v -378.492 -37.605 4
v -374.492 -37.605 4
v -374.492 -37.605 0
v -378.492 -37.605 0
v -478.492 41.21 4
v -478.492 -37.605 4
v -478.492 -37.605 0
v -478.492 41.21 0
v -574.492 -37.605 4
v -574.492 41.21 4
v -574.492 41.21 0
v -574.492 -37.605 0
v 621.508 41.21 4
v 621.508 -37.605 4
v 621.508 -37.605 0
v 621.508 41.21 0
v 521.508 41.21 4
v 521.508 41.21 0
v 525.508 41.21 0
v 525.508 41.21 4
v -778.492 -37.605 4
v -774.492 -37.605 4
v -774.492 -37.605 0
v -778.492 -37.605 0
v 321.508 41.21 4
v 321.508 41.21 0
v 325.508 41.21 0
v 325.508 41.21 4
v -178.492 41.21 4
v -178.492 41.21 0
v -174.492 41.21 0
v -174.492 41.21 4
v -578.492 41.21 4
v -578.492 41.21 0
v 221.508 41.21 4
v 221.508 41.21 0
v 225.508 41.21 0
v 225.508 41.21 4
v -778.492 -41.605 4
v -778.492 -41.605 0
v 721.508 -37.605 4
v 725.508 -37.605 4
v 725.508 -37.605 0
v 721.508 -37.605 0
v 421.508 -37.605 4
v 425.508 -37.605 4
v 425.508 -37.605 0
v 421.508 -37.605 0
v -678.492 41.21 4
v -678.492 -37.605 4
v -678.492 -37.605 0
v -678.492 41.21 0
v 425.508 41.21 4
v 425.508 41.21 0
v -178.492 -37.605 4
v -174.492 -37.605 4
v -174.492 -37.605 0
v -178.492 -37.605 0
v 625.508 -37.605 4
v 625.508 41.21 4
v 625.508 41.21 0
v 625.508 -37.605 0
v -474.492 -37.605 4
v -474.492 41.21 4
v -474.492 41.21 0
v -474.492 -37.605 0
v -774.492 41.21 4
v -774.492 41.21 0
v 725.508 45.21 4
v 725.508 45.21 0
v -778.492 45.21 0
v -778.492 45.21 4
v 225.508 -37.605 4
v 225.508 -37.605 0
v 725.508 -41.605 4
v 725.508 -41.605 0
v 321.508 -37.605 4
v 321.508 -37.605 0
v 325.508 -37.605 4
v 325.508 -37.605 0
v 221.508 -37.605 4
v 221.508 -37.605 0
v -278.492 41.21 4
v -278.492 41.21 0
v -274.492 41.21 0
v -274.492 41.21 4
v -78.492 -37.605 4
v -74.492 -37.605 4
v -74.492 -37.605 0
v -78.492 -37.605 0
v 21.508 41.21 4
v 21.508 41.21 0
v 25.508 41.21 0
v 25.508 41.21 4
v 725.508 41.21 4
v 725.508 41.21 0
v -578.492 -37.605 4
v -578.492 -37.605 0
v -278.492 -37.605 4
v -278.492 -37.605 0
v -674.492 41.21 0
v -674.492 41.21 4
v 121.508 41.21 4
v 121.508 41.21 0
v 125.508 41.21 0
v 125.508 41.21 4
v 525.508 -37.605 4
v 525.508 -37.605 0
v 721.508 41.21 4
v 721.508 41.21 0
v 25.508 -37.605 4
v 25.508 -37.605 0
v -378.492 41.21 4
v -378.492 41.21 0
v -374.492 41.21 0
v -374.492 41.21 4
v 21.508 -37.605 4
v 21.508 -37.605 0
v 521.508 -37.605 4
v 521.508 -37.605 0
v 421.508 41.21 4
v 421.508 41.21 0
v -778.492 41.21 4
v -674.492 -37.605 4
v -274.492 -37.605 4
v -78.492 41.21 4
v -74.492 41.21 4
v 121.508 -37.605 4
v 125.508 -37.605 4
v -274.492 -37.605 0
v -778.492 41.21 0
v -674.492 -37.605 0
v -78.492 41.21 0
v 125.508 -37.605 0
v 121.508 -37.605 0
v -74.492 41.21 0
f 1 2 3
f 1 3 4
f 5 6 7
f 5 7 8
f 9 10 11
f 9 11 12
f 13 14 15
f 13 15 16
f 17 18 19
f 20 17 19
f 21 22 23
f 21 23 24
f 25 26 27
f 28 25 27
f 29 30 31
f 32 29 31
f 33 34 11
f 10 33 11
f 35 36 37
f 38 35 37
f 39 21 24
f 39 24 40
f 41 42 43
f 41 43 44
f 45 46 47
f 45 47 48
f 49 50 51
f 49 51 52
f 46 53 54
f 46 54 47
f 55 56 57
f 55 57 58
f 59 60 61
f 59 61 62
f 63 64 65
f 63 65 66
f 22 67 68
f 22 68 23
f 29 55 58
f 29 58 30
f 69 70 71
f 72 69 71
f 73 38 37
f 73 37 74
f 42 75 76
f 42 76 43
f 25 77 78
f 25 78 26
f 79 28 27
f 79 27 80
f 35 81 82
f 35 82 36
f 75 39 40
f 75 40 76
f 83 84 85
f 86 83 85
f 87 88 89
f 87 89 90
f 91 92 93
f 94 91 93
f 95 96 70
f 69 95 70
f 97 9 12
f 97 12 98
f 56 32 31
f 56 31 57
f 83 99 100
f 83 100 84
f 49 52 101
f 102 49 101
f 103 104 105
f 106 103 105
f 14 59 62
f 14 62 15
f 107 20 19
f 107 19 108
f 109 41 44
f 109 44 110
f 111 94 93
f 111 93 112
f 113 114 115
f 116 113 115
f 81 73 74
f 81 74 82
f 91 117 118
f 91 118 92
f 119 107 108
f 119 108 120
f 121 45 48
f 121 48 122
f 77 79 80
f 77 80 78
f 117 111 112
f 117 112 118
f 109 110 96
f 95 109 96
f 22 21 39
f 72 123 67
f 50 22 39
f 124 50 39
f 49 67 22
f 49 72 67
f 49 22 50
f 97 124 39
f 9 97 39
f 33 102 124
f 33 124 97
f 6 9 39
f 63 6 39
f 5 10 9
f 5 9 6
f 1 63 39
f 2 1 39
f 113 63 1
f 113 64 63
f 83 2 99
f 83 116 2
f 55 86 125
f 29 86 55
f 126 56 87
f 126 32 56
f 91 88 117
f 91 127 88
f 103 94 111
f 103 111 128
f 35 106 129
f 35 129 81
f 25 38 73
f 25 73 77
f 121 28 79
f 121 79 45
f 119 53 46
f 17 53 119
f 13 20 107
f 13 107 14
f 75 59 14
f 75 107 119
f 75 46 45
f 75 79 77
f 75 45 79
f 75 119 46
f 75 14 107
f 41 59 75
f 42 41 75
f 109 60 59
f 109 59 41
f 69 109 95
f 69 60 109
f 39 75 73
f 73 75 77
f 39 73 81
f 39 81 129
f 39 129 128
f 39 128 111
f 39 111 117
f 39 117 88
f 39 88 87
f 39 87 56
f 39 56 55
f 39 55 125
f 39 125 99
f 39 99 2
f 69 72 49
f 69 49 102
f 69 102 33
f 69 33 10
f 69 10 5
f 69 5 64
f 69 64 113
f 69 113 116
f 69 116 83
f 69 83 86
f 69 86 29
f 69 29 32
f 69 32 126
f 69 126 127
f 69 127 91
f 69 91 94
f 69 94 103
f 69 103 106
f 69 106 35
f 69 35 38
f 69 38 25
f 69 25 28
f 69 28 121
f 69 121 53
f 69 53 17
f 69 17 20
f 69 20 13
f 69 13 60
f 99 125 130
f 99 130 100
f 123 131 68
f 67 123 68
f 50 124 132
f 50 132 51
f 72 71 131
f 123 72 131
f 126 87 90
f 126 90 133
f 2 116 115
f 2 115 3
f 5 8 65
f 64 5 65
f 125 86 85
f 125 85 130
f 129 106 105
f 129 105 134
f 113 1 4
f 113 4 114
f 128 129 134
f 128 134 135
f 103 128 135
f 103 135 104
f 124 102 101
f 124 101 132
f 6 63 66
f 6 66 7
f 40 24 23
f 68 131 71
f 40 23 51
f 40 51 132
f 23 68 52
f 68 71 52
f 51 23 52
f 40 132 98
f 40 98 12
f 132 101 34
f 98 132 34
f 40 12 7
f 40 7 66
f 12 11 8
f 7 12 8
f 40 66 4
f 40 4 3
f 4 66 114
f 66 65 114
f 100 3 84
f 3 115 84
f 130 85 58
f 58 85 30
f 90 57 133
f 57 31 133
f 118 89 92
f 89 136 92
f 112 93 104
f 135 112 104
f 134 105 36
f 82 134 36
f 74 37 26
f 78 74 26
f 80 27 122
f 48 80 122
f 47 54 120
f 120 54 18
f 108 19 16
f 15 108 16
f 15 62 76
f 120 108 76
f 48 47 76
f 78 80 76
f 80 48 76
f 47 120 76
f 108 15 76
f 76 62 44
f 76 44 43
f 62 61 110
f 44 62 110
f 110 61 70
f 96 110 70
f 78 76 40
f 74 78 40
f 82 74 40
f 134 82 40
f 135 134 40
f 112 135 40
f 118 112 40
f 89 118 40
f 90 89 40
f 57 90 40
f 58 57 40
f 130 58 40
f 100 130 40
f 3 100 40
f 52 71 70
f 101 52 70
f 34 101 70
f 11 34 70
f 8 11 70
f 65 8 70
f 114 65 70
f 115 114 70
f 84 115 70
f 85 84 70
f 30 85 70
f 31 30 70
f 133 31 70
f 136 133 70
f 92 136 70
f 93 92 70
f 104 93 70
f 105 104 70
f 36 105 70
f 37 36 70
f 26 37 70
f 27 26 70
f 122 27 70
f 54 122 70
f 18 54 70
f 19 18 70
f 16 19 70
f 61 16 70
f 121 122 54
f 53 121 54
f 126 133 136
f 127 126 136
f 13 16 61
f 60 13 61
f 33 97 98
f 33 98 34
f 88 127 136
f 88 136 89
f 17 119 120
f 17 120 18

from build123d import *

# Parameters (mm, degrees)
BOSS_EXTRUDE1_DEPTH = 4
BOSS_EXTRUDE2_DEPTH = 4


with BuildPart() as part:
    # Sketch2 → Boss-Extrude1 (new body)
    with BuildSketch(Plane.XY):
        Polygon((725.508397322, 45.210025961), (-778.491602678, 45.210025961), (-778.491602678, 41.210025961), (-774.491602678, 41.210025961), (-774.491602678, 1.805025961), (-750.491602678, 1.805025961), (-756.491602678, 9.805025961), (-732.491602678, 9.805025961), (-738.491602678, 1.805025961), (-714.491602678, 1.805025961), (-720.491602678, 9.805025961), (-696.491602678, 9.805025961), (-702.491602678, 1.805025961), (-678.491602678, 1.805025961), (-678.491602678, 41.210025961), (-674.491602678, 41.210025961), (-674.491602678, 1.805025961), (-650.491602678, 1.805025961), (-656.491602678, 9.805025961), (-632.491602678, 9.805025961), (-638.491602678, 1.805025961), (-614.491602678, 1.805025961), (-620.491602678, 9.805025961), (-596.491602678, 9.805025961), (-602.491602678, 1.805025961), (-578.491602678, 1.805025961), (-578.491602678, 41.210025961), (-574.491602678, 41.210025961), (-574.491602678, 1.805025961), (-550.491602678, 1.805025961), (-556.491602678, 9.805025961), (-532.491602678, 9.805025961), (-538.491602678, 1.805025961), (-514.491602678, 1.805025961), (-520.491602678, 9.805025961), (-496.491602678, 9.805025961), (-502.491602678, 1.805025961), (-478.491602678, 1.805025961), (-478.491602678, 41.210025961), (-474.491602678, 41.210025961), (-474.491602678, 1.805025961), (-450.491602678, 1.805025961), (-456.491602678, 9.805025961), (-432.491602678, 9.805025961), (-438.491602678, 1.805025961), (-414.491602678, 1.805025961), (-420.491602678, 9.805025961), (-396.491602678, 9.805025961), (-402.491602678, 1.805025961), (-378.491602678, 1.805025961), (-378.491602678, 41.210025961), (-374.491602678, 41.210025961), (-374.491602678, 1.805025961), (-350.491602678, 1.805025961), (-356.491602678, 9.805025961), (-332.491602678, 9.805025961), (-338.491602678, 1.805025961), (-314.491602678, 1.805025961), (-320.491602678, 9.805025961), (-296.491602678, 9.805025961), (-302.491602678, 1.805025961), (-278.491602678, 1.805025961), (-278.491602678, 41.210025961), (-274.491602678, 41.210025961), (-274.491602678, 1.805025961), (-250.491602678, 1.805025961), (-256.491602678, 9.805025961), (-232.491602678, 9.805025961), (-238.491602678, 1.805025961), (-214.491602678, 1.805025961), (-220.491602678, 9.805025961), (-196.491602678, 9.805025961), (-202.491602678, 1.805025961), (-178.491602678, 1.805025961), (-178.491602678, 41.210025961), (-174.491602678, 41.210025961), (-174.491602678, 1.805025961), (-150.491602678, 1.805025961), (-156.491602678, 9.805025961), (-132.491602678, 9.805025961), (-138.491602678, 1.805025961), (-114.491602678, 1.805025961), (-120.491602678, 9.805025961), (-96.491602678, 9.805025961), (-102.491602678, 1.805025961), (-78.491602678, 1.805025961), (-78.491602678, 41.210025961), (-74.491602678, 41.210025961), (-74.491602678, 1.805025961), (-50.491602678, 1.805025961), (-56.491602678, 9.805025961), (-32.491602678, 9.805025961), (-38.491602678, 1.805025961), (-14.491602678, 1.805025961), (-20.491602678, 9.805025961), (3.508397322, 9.805025961), (-2.491602678, 1.805025961), (21.508397322, 1.805025961), (21.508397322, 41.210025961), (25.508397322, 41.210025961), (25.508397322, 1.805025961), (49.508397322, 1.805025961), (43.508397322, 9.805025961), (67.508397322, 9.805025961), (61.508397322, 1.805025961), (85.508397322, 1.805025961), (79.508397322, 9.805025961), (103.508397322, 9.805025961), (97.508397322, 1.805025961), (121.508397322, 1.805025961), (121.508397322, 41.210025961), (125.508397322, 41.210025961), (125.508397322, 1.805025961), (149.508397322, 1.805025961), (143.508397322, 9.805025961), (167.508397322, 9.805025961), (161.508397322, 1.805025961), (185.508397322, 1.805025961), (179.508397322, 9.805025961), (203.508397322, 9.805025961), (197.508397322, 1.805025961), (221.508397322, 1.805025961), (221.508397322, 41.210025961), (225.508397322, 41.210025961), (225.508397322, 1.805025961), (249.508397322, 1.805025961), (243.508397322, 9.805025961), (267.508397322, 9.805025961), (261.508397322, 1.805025961), (285.508397322, 1.805025961), (279.508397322, 9.805025961), (303.508397322, 9.805025961), (297.508397322, 1.805025961), (321.508397322, 1.805025961), (321.508397322, 41.210025961), (325.508397322, 41.210025961), (325.508397322, 1.805025961), (349.508397322, 1.805025961), (343.508397322, 9.805025961), (367.508397322, 9.805025961), (361.508397322, 1.805025961), (385.508397322, 1.805025961), (379.508397322, 9.805025961), (403.508397322, 9.805025961), (397.508397322, 1.805025961), (421.508397322, 1.805025961), (421.508397322, 41.210025961), (425.508397322, 41.210025961), (425.508397322, 1.805025961), (449.508397322, 1.805025961), (443.508397322, 9.805025961), (467.508397322, 9.805025961), (461.508397322, 1.805025961), (485.508397322, 1.805025961), (479.508397322, 9.805025961), (503.508397322, 9.805025961), (497.508397322, 1.805025961), (521.508397322, 1.805025961), (521.508397322, 41.210025961), (525.508397322, 41.210025961), (525.508397322, 1.805025961), (549.508397322, 1.805025961), (543.508397322, 9.805025961), (567.508397322, 9.805025961), (561.508397322, 1.805025961), (585.508397322, 1.805025961), (579.508397322, 9.805025961), (603.508397322, 9.805025961), (597.508397322, 1.805025961), (621.508397322, 1.805025961), (621.508397322, 41.210025961), (625.508397322, 41.210025961), (625.508397322, 1.805025961), (649.508397322, 1.805025961), (643.508397322, 9.805025961), (667.508397322, 9.805025961), (661.508397322, 1.805025961), (685.508397322, 1.805025961), (679.508397322, 9.805025961), (703.508397322, 9.805025961), (697.508397322, 1.805025961), (721.508397322, 1.805025961), (721.508397322, 41.210025961), (725.508397322, 41.210025961), align=None)
    extrude(amount=BOSS_EXTRUDE1_DEPTH)

    # Sketch3 → Boss-Extrude2 (add)
    with BuildSketch(Plane.XY.offset(4)):
        Polygon((-774.491602678, 1.805025961), (-774.491602678, -37.604974039), (-778.491602678, -37.604974039), (-778.491602678, -41.604974039), (725.508397322, -41.604974039), (725.508397322, -37.604974039), (721.508397322, -37.604974039), (721.508397322, 1.805025961), (697.508397322, 1.805025961), (703.508397322, 9.805025961), (679.508397322, 9.805025961), (685.508397322, 1.805025961), (661.508397322, 1.805025961), (667.508397322, 9.805025961), (643.508397322, 9.805025961), (649.508397322, 1.805025961), (625.508397322, 1.805025961), (625.508397322, -37.604974039), (621.508397322, -37.604974039), (621.508397322, 1.805025961), (597.508397322, 1.805025961), (603.508397322, 9.805025961), (579.508397322, 9.805025961), (585.508397322, 1.805025961), (561.508397322, 1.805025961), (567.508397322, 9.805025961), (543.508397322, 9.805025961), (549.508397322, 1.805025961), (525.508397322, 1.805025961), (525.508397322, -37.604974039), (521.508397322, -37.604974039), (521.508397322, 1.805025961), (497.508397322, 1.805025961), (503.508397322, 9.805025961), (479.508397322, 9.805025961), (485.508397322, 1.805025961), (461.508397322, 1.805025961), (467.508397322, 9.805025961), (443.508397322, 9.805025961), (449.508397322, 1.805025961), (425.508397322, 1.805025961), (425.508397322, -37.604974039), (421.508397322, -37.604974039), (421.508397322, 1.805025961), (397.508397322, 1.805025961), (403.508397322, 9.805025961), (379.508397322, 9.805025961), (385.508397322, 1.805025961), (361.508397322, 1.805025961), (367.508397322, 9.805025961), (343.508397322, 9.805025961), (349.508397322, 1.805025961), (325.508397322, 1.805025961), (325.508397322, -37.604974039), (321.508397322, -37.604974039), (321.508397322, 1.805025961), (297.508397322, 1.805025961), (303.508397322, 9.805025961), (279.508397322, 9.805025961), (285.508397322, 1.805025961), (261.508397322, 1.805025961), (267.508397322, 9.805025961), (243.508397322, 9.805025961), (249.508397322, 1.805025961), (225.508397322, 1.805025961), (225.508397322, -37.604974039), (221.508397322, -37.604974039), (221.508397322, 1.805025961), (197.508397322, 1.805025961), (203.508397322, 9.805025961), (179.508397322, 9.805025961), (185.508397322, 1.805025961), (161.508397322, 1.805025961), (167.508397322, 9.805025961), (143.508397322, 9.805025961), (149.508397322, 1.805025961), (125.508397322, 1.805025961), (125.508397322, -37.604974039), (121.508397322, -37.604974039), (121.508397322, 1.805025961), (97.508397322, 1.805025961), (103.508397322, 9.805025961), (79.508397322, 9.805025961), (85.508397322, 1.805025961), (61.508397322, 1.805025961), (67.508397322, 9.805025961), (43.508397322, 9.805025961), (49.508397322, 1.805025961), (25.508397322, 1.805025961), (25.508397322, -37.604974039), (21.508397322, -37.604974039), (21.508397322, 1.805025961), (-2.491602678, 1.805025961), (3.508397322, 9.805025961), (-20.491602678, 9.805025961), (-14.491602678, 1.805025961), (-38.491602678, 1.805025961), (-32.491602678, 9.805025961), (-56.491602678, 9.805025961), (-50.491602678, 1.805025961), (-74.491602678, 1.805025961), (-74.491602678, -37.604974039), (-78.491602678, -37.604974039), (-78.491602678, 1.805025961), (-102.491602678, 1.805025961), (-96.491602678, 9.805025961), (-120.491602678, 9.805025961), (-114.491602678, 1.805025961), (-138.491602678, 1.805025961), (-132.491602678, 9.805025961), (-156.491602678, 9.805025961), (-150.491602678, 1.805025961), (-174.491602678, 1.805025961), (-174.491602678, -37.604974039), (-178.491602678, -37.604974039), (-178.491602678, 1.805025961), (-202.491602678, 1.805025961), (-196.491602678, 9.805025961), (-220.491602678, 9.805025961), (-214.491602678, 1.805025961), (-238.491602678, 1.805025961), (-232.491602678, 9.805025961), (-256.491602678, 9.805025961), (-250.491602678, 1.805025961), (-274.491602678, 1.805025961), (-274.491602678, -37.604974039), (-278.491602678, -37.604974039), (-278.491602678, 1.805025961), (-302.491602678, 1.805025961), (-296.491602678, 9.805025961), (-320.491602678, 9.805025961), (-314.491602678, 1.805025961), (-338.491602678, 1.805025961), (-332.491602678, 9.805025961), (-356.491602678, 9.805025961), (-350.491602678, 1.805025961), (-374.491602678, 1.805025961), (-374.491602678, -37.604974039), (-378.491602678, -37.604974039), (-378.491602678, 1.805025961), (-402.491602678, 1.805025961), (-396.491602678, 9.805025961), (-420.491602678, 9.805025961), (-414.491602678, 1.805025961), (-438.491602678, 1.805025961), (-432.491602678, 9.805025961), (-456.491602678, 9.805025961), (-450.491602678, 1.805025961), (-474.491602678, 1.805025961), (-474.491602678, -37.604974039), (-478.491602678, -37.604974039), (-478.491602678, 1.805025961), (-502.491602678, 1.805025961), (-496.491602678, 9.805025961), (-520.491602678, 9.805025961), (-514.491602678, 1.805025961), (-538.491602678, 1.805025961), (-532.491602678, 9.805025961), (-556.491602678, 9.805025961), (-550.491602678, 1.805025961), (-574.491602678, 1.805025961), (-574.491602678, -37.604974039), (-578.491602678, -37.604974039), (-578.491602678, 1.805025961), (-602.491602678, 1.805025961), (-596.491602678, 9.805025961), (-620.491602678, 9.805025961), (-614.491602678, 1.805025961), (-638.491602678, 1.805025961), (-632.491602678, 9.805025961), (-656.491602678, 9.805025961), (-650.491602678, 1.805025961), (-674.491602678, 1.805025961), (-674.491602678, -37.604974039), (-678.491602678, -37.604974039), (-678.491602678, 1.805025961), (-702.491602678, 1.805025961), (-696.491602678, 9.805025961), (-720.491602678, 9.805025961), (-714.491602678, 1.805025961), (-738.491602678, 1.805025961), (-732.491602678, 9.805025961), (-756.491602678, 9.805025961), (-750.491602678, 1.805025961), align=None)
    extrude(amount=-BOSS_EXTRUDE2_DEPTH)


solid = part.part
